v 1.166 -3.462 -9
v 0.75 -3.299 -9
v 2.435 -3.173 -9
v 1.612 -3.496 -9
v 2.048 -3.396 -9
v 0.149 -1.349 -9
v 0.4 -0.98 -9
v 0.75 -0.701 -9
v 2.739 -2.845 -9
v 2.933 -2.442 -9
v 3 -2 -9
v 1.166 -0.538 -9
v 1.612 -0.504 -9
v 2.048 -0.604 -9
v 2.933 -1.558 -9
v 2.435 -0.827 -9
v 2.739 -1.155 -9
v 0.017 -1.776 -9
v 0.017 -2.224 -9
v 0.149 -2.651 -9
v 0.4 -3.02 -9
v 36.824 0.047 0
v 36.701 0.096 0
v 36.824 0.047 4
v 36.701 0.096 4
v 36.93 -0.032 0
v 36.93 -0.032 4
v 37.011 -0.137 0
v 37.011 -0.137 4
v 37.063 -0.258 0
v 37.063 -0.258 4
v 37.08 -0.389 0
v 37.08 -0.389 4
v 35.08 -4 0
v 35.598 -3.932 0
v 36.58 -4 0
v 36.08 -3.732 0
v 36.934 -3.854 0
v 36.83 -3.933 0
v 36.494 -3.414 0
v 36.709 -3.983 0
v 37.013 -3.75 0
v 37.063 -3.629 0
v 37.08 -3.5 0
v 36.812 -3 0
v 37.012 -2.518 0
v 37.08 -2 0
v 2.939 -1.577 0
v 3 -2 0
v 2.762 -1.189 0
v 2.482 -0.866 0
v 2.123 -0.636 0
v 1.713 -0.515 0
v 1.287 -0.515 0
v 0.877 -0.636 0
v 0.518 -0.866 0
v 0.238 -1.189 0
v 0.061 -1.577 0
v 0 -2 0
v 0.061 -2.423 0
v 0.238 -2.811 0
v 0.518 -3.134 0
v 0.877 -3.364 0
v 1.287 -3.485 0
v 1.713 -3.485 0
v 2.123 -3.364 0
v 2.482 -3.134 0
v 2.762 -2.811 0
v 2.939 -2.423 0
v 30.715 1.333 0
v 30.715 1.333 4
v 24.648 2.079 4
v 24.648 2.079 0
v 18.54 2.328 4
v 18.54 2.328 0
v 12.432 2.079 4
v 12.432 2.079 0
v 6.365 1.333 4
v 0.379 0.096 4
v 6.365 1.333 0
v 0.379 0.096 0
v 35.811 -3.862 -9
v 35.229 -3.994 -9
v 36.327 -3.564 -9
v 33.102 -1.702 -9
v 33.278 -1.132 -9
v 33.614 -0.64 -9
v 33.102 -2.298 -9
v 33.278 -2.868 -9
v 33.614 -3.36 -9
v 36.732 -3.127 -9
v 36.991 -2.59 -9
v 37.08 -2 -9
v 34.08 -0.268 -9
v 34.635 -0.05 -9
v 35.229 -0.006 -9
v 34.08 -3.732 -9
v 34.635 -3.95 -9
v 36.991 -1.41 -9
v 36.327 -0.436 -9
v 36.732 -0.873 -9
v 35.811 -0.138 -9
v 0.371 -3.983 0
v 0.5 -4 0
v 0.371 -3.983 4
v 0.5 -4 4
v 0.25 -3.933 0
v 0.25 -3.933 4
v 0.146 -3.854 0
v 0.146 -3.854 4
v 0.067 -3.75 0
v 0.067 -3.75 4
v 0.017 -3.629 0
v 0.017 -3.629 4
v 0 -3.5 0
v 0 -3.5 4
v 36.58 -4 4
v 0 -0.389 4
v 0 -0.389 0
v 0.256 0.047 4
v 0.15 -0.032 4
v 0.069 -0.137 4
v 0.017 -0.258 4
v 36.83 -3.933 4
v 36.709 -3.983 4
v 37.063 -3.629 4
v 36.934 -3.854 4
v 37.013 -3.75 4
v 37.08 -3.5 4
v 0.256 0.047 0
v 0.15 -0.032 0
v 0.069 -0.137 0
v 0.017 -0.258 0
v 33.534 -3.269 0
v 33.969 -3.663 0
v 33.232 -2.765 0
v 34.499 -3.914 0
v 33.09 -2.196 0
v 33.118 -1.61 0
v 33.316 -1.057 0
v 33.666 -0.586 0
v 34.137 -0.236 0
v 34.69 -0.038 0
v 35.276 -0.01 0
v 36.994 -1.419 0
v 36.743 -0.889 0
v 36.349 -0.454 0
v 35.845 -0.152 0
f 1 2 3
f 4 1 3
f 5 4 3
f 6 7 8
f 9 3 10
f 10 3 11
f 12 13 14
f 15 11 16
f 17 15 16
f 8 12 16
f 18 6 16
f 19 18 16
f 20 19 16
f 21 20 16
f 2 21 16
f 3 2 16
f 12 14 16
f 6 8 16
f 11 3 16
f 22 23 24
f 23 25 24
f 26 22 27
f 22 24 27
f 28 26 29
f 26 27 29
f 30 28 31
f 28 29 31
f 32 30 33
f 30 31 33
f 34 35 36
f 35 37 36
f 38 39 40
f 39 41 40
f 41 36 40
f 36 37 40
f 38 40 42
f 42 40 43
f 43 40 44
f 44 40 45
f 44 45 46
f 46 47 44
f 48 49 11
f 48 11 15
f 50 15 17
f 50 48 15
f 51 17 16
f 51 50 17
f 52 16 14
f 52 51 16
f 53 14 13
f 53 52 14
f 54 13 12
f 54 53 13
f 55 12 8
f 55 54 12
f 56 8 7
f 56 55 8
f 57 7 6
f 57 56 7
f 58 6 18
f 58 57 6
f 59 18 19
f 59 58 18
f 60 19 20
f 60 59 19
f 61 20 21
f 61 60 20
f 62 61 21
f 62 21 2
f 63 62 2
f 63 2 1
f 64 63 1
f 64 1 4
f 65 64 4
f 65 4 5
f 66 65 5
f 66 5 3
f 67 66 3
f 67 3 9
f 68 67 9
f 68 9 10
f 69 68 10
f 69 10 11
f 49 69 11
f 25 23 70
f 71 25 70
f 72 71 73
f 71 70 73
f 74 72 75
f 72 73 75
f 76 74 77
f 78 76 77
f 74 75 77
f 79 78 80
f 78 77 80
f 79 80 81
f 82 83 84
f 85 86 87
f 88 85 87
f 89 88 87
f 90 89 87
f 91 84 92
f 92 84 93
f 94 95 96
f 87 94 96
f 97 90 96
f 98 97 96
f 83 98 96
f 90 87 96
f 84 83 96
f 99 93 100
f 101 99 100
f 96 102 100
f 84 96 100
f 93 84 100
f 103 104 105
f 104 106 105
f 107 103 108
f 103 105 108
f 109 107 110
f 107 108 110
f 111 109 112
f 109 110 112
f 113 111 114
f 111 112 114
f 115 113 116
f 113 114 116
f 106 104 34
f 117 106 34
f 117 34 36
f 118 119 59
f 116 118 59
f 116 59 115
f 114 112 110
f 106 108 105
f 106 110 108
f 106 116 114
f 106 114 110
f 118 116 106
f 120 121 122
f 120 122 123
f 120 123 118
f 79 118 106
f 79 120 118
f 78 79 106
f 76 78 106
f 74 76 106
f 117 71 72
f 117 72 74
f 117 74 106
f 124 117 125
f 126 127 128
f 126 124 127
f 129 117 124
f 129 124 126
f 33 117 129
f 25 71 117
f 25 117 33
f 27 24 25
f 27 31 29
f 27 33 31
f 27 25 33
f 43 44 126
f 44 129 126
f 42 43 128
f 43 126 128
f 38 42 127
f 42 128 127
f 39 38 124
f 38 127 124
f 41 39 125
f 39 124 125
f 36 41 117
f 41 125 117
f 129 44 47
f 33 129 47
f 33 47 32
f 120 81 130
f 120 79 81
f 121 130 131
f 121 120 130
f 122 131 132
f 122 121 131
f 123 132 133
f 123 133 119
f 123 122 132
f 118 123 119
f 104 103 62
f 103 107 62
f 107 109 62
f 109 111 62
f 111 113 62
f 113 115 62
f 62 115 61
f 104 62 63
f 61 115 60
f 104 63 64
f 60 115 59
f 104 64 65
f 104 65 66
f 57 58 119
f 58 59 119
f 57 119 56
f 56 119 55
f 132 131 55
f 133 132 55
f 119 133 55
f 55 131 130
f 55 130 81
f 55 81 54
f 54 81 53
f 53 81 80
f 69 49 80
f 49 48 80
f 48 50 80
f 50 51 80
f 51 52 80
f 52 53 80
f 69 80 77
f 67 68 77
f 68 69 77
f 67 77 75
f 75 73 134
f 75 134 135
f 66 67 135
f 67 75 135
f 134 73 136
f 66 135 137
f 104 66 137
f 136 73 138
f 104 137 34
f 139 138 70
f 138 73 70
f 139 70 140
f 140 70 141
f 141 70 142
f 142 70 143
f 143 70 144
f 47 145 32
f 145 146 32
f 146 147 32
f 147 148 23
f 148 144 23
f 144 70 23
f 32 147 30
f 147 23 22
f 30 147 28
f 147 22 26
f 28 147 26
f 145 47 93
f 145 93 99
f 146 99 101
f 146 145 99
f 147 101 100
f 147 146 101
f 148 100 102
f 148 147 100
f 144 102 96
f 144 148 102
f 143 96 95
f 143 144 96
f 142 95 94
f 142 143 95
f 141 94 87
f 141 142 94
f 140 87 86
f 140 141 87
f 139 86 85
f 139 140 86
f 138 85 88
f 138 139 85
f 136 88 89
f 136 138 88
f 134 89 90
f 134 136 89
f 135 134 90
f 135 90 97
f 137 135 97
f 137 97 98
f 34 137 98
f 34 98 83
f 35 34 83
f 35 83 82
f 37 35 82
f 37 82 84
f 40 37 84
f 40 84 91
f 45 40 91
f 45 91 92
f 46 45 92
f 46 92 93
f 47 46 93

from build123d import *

# Parameters (mm, degrees)
BOSS_EXTRUDE1_DEPTH = 4
SKETCH1_3_R         = 1.5
SKETCH1_3_R_2       = 2
BOSS_EXTRUDE2_DEPTH = 9
FILLET1_R           = 0.5


with BuildPart() as part:
    # Sketch1 → Boss-Extrude1 (new body)
    with BuildSketch(Plane.XY):
        with BuildLine():
            Line((0, 0), (0, -4))
            Line((0, -4), (37.08, -4))
            Line((37.08, -4), (37.08, 0))
            ThreePointArc((37.08, 0), (18.54, 2.327664136), (0, 0))
        make_face()
    extrude(amount=BOSS_EXTRUDE1_DEPTH)

    # Sketch1<3> → Boss-Extrude2 (add)
    with BuildSketch(Plane.XY):
        with Locations((1.5, -2)):
            Circle(SKETCH1_3_R)
        with Locations((35.08, -2)):
            Circle(SKETCH1_3_R_2)
    extrude(amount=-BOSS_EXTRUDE2_DEPTH)

    # Fillet1
    fillet1_edges = [part.edges().sort_by_distance(p)[0] for p in [
        (37.08, 0, 2),
        (37.08, -4, 2),
        (0, -4, 2),
        (0, 0, 2),
    ]]
    fillet(fillet1_edges, radius=FILLET1_R)


solid = part.part
